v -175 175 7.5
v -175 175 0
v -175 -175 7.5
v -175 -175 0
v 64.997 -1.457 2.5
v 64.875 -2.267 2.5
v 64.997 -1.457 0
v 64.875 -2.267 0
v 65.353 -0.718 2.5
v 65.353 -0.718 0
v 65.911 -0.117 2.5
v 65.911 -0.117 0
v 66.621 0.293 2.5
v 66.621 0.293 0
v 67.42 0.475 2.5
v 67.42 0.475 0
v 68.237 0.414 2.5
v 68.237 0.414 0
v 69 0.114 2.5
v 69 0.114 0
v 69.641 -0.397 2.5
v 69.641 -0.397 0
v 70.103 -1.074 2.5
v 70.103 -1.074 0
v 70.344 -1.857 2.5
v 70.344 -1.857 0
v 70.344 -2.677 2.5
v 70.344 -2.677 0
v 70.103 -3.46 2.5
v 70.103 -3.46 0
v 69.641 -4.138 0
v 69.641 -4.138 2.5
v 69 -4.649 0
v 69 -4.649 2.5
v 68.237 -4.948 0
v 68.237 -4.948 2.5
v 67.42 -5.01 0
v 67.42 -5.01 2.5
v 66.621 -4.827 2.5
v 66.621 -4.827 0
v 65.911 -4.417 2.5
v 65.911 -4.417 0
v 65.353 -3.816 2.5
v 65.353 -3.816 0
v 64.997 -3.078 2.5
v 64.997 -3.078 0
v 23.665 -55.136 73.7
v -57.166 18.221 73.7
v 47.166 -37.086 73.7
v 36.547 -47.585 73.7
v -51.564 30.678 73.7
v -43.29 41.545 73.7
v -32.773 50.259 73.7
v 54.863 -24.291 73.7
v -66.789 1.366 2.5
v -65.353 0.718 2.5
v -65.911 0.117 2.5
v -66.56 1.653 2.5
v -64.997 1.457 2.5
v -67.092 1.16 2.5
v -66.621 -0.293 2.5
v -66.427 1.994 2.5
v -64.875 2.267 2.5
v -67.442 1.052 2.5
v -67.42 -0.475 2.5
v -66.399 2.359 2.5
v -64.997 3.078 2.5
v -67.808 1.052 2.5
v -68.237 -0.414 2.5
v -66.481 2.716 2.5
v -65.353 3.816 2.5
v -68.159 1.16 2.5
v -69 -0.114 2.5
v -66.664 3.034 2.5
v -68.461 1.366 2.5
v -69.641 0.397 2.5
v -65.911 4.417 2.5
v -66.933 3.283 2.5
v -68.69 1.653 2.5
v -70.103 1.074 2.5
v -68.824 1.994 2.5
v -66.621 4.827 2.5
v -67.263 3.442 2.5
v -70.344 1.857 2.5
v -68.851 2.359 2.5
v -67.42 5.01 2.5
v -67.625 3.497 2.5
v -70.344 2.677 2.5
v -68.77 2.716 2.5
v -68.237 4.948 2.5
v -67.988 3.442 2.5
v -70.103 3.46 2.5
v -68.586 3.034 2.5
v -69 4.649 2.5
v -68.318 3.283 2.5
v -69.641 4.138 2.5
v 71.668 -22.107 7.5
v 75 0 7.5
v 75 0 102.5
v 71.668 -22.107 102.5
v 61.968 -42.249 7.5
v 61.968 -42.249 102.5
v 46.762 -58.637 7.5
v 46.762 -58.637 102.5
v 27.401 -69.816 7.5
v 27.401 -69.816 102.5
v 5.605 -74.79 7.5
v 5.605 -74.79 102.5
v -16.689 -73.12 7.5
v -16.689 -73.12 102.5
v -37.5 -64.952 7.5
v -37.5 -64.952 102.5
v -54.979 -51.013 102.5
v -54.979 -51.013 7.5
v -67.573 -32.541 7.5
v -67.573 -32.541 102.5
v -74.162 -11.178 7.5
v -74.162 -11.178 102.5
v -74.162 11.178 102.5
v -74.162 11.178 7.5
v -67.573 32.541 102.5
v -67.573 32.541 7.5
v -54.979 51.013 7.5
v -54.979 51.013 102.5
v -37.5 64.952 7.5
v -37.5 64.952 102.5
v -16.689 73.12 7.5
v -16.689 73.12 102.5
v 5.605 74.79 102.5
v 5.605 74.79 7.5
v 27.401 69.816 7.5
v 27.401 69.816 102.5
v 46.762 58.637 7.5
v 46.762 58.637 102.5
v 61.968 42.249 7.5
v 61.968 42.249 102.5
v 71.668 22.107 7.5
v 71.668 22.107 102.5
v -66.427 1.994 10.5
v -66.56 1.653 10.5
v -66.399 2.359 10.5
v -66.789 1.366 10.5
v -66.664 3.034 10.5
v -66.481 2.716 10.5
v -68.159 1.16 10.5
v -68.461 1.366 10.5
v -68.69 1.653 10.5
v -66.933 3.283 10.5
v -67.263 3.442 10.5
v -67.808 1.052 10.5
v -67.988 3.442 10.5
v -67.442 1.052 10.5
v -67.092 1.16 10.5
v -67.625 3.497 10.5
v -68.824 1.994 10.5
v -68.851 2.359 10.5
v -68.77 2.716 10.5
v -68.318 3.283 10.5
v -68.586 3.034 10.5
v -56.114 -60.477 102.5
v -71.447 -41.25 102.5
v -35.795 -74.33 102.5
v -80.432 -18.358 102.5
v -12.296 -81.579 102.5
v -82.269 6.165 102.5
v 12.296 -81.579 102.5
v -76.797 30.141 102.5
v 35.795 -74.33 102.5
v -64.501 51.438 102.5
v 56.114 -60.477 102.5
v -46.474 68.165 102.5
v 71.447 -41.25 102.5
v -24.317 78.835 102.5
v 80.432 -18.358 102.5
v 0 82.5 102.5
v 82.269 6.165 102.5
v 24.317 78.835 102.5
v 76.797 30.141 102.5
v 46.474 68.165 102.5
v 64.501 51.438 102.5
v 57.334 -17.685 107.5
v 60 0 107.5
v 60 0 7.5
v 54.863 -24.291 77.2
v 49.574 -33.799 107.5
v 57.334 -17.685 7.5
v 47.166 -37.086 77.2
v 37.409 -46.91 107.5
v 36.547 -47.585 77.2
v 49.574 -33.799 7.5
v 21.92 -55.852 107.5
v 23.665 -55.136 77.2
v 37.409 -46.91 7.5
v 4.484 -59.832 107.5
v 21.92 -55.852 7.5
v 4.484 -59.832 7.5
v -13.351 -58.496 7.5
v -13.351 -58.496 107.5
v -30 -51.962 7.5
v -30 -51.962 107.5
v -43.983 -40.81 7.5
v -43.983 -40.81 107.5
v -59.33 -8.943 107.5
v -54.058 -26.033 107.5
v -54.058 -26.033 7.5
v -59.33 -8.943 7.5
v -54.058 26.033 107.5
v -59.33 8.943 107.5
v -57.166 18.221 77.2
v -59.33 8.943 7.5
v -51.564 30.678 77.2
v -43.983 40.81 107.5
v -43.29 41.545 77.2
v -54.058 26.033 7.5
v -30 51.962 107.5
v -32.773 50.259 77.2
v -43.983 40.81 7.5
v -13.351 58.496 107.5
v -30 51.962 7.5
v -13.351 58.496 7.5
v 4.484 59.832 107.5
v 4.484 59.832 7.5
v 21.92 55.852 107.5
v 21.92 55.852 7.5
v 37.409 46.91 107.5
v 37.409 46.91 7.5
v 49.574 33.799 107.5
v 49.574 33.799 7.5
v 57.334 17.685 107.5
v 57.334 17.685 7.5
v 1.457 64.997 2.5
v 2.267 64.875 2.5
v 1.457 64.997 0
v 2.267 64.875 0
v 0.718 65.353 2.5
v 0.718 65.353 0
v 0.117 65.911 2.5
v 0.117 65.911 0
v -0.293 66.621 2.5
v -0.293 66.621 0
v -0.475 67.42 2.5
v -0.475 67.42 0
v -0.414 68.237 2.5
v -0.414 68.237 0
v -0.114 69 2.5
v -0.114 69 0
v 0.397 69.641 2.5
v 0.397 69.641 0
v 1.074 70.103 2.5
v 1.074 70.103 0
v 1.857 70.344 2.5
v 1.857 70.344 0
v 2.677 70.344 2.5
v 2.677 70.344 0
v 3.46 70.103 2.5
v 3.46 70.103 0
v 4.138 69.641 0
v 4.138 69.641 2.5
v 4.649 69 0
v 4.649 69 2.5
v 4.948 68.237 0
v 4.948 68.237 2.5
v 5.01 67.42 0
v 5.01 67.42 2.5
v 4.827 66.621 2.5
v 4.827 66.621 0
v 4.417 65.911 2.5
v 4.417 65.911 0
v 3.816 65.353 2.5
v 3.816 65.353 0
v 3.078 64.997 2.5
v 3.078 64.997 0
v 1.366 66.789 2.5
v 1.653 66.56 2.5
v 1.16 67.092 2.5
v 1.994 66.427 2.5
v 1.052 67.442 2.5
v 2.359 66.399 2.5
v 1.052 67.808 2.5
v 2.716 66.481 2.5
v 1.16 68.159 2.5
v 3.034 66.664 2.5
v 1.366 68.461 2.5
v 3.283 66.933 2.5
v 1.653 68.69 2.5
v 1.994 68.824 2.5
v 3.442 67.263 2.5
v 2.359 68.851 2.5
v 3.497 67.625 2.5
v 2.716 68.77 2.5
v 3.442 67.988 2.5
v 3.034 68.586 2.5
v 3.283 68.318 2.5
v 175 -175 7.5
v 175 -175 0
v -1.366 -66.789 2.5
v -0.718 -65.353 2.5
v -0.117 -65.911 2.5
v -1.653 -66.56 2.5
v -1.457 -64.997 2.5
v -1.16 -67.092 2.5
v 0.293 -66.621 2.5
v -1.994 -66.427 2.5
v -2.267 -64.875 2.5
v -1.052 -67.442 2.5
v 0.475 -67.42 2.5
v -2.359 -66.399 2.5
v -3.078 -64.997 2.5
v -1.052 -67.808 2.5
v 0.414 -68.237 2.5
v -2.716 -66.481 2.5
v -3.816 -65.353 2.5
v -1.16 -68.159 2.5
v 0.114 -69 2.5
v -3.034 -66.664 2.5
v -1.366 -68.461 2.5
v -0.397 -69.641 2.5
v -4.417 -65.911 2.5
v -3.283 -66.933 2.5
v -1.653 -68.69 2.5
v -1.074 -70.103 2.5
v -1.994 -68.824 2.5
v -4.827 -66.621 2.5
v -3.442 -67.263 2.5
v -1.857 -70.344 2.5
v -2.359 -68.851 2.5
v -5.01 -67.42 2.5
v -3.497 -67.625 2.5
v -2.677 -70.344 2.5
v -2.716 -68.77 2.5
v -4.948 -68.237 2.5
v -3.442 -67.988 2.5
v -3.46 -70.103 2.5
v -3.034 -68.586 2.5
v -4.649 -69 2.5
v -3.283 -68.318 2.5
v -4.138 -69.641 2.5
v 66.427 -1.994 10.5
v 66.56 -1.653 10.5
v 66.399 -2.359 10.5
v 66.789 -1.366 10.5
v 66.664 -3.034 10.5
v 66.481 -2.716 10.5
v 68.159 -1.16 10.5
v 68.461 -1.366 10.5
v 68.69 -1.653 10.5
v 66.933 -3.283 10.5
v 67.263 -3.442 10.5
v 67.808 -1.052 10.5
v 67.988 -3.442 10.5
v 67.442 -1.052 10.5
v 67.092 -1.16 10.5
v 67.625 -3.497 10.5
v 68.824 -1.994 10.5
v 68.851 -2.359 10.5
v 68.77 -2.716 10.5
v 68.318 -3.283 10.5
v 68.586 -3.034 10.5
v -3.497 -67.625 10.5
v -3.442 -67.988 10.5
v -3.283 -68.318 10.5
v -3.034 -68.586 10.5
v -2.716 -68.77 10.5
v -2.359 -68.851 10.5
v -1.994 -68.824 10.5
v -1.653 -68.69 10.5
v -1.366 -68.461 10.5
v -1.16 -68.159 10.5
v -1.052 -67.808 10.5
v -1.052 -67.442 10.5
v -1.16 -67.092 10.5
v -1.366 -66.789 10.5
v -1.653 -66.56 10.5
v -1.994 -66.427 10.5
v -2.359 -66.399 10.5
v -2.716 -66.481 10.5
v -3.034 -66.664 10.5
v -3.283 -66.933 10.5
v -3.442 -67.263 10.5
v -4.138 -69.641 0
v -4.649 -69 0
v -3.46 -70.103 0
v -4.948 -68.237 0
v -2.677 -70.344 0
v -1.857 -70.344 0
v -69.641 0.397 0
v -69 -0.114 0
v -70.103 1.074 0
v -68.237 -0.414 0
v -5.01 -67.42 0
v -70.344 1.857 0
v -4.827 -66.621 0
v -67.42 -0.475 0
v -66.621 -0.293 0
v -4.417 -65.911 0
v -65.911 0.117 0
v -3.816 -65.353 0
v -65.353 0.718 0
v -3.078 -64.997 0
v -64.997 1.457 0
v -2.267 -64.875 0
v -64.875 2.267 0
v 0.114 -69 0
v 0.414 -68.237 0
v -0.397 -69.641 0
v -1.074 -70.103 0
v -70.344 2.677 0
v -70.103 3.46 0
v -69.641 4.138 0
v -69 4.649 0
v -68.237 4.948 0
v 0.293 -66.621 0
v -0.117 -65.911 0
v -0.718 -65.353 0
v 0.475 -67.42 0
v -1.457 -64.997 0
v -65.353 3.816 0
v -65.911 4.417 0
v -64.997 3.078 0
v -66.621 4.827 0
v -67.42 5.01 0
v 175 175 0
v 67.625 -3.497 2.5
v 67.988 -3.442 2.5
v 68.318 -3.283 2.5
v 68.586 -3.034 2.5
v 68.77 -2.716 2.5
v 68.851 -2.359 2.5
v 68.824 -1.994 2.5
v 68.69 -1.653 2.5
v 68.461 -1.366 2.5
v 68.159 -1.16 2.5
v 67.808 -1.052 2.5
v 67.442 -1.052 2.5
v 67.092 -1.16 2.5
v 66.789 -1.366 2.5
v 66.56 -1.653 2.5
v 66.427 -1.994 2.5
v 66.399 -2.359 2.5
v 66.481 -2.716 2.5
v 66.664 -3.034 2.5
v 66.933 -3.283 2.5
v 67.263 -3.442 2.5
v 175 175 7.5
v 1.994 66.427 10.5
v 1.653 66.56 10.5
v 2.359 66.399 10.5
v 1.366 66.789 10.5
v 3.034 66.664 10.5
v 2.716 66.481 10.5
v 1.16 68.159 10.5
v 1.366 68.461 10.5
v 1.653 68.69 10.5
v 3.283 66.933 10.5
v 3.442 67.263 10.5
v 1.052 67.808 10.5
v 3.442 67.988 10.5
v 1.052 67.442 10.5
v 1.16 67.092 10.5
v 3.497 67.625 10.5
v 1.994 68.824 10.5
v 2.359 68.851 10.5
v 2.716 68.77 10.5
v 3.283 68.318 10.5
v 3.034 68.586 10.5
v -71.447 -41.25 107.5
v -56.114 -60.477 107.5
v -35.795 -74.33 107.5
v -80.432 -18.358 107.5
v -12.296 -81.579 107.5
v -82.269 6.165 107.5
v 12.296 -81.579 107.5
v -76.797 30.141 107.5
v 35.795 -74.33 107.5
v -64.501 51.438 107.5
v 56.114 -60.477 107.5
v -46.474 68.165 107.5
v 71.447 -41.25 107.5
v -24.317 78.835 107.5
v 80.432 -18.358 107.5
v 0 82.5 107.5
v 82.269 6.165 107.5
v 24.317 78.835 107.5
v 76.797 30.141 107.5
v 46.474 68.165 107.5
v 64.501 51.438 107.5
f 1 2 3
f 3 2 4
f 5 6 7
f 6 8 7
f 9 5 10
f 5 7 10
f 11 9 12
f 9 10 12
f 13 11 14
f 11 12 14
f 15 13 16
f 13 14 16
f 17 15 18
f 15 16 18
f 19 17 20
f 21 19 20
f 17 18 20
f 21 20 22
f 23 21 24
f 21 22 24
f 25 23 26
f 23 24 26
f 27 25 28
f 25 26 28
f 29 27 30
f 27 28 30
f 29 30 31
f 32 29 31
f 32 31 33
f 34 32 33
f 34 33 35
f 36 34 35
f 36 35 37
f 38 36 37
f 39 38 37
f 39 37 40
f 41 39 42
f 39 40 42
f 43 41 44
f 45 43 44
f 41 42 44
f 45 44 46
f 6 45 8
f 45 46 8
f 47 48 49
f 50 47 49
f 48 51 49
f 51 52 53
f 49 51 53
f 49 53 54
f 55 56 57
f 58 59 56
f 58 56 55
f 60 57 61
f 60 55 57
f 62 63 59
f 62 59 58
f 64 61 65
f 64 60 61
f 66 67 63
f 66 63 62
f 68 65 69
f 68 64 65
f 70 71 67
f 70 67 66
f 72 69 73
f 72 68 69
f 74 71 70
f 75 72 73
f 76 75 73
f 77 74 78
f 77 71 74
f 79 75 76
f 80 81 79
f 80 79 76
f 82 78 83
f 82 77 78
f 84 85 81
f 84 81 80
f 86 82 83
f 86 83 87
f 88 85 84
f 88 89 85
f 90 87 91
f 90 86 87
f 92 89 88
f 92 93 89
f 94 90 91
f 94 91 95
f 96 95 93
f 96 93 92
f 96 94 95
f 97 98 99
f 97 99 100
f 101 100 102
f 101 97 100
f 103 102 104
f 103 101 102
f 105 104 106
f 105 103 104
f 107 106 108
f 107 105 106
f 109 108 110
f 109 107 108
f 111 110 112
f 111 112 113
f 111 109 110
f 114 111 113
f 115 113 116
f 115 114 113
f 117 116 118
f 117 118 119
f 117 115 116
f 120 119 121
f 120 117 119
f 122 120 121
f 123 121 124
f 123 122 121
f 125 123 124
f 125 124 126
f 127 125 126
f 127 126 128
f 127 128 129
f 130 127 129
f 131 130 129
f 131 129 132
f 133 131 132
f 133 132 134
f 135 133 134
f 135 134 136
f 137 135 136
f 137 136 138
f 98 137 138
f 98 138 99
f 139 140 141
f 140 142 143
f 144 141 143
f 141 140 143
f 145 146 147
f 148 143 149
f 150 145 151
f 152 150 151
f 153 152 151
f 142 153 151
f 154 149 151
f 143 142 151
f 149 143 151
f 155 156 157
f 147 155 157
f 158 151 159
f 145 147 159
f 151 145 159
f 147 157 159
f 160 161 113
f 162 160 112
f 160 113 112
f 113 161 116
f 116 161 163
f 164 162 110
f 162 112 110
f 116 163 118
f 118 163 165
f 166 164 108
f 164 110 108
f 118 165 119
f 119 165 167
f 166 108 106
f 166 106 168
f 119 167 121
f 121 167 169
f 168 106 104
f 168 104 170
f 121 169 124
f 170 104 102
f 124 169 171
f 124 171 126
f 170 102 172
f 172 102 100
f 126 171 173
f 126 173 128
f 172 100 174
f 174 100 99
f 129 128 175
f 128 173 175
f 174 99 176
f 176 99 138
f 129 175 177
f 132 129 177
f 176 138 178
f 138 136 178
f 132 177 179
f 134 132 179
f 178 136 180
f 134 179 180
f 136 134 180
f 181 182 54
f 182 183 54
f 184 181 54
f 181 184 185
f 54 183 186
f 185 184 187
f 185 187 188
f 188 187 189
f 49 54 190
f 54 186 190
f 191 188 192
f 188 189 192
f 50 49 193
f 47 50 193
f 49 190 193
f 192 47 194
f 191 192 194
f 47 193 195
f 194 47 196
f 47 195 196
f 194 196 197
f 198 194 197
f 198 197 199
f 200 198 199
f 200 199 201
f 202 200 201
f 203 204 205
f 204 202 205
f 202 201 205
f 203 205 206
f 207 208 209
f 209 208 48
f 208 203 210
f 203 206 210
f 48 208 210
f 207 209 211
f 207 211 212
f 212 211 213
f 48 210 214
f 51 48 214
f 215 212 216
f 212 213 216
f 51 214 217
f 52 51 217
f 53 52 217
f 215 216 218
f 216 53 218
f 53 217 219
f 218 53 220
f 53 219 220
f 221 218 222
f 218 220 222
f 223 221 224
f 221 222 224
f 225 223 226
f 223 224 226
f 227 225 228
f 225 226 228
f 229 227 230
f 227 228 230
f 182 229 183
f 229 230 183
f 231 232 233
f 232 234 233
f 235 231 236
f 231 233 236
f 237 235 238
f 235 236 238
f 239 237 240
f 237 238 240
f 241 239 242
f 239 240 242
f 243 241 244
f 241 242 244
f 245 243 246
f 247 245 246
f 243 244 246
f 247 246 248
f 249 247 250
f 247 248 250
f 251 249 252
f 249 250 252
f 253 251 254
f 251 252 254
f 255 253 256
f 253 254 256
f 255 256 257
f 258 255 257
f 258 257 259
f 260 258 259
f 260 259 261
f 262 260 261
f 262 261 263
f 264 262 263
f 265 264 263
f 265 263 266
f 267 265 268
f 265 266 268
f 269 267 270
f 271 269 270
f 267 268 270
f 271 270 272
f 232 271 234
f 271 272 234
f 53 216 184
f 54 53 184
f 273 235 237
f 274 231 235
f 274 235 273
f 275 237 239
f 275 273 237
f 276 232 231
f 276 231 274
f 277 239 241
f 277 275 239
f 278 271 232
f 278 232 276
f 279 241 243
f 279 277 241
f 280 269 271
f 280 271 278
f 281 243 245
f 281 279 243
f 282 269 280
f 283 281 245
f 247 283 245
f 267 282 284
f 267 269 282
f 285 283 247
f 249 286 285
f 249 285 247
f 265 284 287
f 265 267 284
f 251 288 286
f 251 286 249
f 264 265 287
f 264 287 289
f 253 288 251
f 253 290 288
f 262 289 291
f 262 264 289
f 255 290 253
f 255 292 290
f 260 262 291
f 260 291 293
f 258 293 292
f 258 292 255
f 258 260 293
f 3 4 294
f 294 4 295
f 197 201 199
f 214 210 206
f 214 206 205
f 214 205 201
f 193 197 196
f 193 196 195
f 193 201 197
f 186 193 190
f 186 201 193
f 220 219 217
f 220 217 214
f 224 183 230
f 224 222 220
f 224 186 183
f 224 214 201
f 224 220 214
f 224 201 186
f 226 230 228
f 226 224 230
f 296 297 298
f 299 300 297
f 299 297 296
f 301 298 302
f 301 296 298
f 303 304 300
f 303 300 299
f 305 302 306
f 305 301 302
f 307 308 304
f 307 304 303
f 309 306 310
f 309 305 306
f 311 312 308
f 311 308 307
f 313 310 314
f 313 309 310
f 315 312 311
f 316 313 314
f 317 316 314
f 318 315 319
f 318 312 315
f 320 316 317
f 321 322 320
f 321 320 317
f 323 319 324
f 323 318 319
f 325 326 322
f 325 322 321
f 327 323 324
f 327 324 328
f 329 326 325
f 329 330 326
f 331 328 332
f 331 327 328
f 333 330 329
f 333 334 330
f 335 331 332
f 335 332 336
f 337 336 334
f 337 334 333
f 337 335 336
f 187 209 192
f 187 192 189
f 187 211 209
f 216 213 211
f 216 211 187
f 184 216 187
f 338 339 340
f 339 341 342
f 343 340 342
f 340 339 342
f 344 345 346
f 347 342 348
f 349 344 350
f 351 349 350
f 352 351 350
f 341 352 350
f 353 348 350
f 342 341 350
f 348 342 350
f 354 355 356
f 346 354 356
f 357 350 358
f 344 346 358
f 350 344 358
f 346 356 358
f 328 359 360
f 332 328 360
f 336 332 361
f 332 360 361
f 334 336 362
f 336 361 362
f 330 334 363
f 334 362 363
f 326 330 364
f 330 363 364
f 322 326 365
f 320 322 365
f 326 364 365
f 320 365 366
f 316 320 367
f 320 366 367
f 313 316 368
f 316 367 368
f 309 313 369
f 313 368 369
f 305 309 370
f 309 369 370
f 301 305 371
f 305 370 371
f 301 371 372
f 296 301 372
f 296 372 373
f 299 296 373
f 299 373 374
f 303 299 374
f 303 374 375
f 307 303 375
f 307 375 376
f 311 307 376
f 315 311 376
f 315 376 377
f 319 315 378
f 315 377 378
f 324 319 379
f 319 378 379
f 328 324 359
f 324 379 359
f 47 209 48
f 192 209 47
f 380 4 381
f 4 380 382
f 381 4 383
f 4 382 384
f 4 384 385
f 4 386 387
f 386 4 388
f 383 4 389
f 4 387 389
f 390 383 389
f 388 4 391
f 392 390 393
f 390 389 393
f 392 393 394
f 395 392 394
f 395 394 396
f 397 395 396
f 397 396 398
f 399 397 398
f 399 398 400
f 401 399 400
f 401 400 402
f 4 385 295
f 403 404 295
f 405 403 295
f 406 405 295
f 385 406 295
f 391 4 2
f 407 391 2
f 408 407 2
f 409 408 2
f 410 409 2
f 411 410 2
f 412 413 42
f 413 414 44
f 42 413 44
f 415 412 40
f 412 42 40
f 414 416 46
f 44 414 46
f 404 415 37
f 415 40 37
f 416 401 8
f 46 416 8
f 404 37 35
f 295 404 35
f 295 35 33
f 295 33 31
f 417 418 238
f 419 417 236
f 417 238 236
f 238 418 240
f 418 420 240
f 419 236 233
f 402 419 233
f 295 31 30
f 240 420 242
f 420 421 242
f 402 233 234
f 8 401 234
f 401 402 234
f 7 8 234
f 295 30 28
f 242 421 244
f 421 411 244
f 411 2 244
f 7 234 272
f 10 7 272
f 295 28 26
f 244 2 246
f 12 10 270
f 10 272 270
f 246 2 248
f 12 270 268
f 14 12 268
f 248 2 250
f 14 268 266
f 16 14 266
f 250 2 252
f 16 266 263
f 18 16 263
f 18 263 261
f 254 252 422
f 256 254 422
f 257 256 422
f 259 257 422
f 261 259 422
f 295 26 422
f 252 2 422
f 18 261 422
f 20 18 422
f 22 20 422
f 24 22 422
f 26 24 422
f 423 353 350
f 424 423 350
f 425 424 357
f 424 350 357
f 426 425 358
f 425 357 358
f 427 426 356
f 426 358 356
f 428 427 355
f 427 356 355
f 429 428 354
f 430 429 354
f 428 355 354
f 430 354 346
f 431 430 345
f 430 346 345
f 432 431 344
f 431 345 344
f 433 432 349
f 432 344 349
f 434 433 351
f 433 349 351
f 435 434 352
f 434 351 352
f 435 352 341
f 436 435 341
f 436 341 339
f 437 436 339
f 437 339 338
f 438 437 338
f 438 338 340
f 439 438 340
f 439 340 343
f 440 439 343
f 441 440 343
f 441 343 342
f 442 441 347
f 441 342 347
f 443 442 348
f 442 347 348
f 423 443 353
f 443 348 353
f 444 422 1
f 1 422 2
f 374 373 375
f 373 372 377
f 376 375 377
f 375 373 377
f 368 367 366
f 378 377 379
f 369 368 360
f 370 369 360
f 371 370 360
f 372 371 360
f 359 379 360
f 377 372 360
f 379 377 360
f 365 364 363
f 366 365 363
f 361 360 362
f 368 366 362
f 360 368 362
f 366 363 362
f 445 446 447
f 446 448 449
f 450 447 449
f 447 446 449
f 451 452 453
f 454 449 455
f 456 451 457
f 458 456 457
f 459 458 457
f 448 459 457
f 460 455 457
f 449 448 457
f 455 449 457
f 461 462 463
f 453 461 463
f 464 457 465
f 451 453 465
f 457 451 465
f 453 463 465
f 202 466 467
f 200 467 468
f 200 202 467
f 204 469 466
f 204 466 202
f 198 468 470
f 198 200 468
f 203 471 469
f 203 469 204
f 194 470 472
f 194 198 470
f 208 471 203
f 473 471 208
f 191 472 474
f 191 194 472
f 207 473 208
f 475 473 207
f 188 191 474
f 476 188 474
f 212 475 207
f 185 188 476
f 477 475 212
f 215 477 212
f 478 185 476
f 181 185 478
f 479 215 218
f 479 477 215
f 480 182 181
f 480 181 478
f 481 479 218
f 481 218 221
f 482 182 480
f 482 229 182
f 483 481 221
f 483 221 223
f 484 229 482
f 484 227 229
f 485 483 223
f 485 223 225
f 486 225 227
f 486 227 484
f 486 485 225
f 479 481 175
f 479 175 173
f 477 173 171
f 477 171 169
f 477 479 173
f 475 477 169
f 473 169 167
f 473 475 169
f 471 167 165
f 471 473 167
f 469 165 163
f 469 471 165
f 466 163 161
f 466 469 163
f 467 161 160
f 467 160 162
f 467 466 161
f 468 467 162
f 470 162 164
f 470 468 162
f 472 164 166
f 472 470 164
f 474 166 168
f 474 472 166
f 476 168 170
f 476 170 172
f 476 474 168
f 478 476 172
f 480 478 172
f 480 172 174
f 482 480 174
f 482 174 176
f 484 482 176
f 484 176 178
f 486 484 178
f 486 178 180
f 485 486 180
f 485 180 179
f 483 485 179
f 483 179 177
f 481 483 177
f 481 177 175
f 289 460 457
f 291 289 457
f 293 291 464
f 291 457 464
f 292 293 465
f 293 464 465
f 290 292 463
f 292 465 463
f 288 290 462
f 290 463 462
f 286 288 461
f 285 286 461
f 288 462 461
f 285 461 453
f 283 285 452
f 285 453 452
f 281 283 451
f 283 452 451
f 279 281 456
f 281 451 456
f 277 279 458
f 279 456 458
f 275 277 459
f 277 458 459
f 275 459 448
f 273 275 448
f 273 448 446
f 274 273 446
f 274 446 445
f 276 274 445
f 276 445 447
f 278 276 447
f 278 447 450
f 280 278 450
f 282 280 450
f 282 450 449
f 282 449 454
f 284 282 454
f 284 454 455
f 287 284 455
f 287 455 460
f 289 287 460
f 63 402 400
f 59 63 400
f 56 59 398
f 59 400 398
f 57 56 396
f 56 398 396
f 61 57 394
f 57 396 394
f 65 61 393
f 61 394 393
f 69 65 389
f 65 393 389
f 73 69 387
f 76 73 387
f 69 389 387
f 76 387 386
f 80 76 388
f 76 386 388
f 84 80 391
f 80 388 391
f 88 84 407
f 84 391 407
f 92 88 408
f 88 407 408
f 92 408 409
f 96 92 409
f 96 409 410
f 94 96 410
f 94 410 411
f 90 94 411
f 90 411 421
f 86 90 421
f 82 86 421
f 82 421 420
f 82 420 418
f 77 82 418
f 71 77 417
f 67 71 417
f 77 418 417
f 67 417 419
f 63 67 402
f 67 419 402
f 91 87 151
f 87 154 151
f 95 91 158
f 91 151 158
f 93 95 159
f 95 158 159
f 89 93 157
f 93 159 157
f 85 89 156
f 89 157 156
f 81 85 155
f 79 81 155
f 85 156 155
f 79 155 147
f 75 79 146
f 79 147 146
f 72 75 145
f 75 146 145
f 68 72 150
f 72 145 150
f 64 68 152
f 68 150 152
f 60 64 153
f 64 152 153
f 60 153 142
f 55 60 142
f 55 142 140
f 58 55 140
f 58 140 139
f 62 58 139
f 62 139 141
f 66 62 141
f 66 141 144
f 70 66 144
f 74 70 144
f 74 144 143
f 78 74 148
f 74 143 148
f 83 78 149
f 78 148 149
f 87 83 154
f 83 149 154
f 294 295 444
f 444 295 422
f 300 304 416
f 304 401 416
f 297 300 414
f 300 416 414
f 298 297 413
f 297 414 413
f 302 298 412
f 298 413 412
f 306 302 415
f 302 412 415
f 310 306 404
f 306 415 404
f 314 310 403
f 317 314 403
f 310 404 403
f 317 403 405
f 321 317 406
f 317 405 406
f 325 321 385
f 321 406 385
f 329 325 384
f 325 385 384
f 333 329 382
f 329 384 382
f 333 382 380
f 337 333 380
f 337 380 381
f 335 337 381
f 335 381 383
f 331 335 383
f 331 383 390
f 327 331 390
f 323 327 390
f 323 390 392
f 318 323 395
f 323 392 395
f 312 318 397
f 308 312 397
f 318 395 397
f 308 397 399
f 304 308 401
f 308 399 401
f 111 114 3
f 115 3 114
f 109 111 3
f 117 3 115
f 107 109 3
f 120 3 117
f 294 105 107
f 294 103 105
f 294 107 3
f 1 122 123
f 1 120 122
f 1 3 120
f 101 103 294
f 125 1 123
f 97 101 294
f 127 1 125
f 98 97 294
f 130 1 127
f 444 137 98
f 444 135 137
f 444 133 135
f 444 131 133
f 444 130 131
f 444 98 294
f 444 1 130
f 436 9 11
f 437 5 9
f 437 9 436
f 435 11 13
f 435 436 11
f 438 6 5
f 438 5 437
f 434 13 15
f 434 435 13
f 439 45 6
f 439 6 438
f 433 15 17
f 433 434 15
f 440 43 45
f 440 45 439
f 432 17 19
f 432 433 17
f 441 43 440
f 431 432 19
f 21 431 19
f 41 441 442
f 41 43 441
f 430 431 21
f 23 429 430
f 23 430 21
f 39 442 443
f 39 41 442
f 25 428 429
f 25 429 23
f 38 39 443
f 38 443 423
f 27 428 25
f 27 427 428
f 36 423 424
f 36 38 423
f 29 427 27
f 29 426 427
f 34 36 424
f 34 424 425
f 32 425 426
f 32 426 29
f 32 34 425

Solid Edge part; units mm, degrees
sketch "Sketch1" plane through (0, 0, 0) normal (0, 0, 1) x (1, 0, 0)
  line L0 (-175, -175) -> (175, -175)
  line L1 (175, -175) -> (175, 175)
  line L2 (175, 175) -> (-175, 175)
  line L3 (-175, 175) -> (-175, -175)
  dimension "D1" = 350
  dimension "D2" = 350
extrude "Protrusion1" add sketch "Sketch1" along normal blind 7.5
sketch "Sketch2" plane through (0, 0, 7.5) normal (0, 0, 1) x (1, 0, 0)
  circle A0 centre (0, 0) radius 75
  circle A1 centre (0, 0) radius 60
extrude "Wyciągnięcie_2" add sketch "Sketch2" along normal blind 100
sketch "Sketch3" plane through (0, 0, 107.5) normal (0, 0, 1) x (0, 1, 0)
  circle A0 centre (0, 0) radius 82.5
  circle A1 centre (0, 0) radius 75
extrude "Wyciągnięcie_3" add sketch "Sketch3" against normal blind 5
sketch "Sketch4" plane through (0, 0, 77.2) normal (0, 0, 1) x (1, 0, 0)
  line L0 (-64.2773, 24.6751) -> (30.7757, -61.5897)
  line L1 (-39.7647, 56.2067) -> (61.855, -30.2388)
  arc A0 (-64.2773, 24.6751) -> (-39.7647, 56.2067) centre (0, 0) cw
  line L2 (30.7757, -61.5897) -> (61.855, -30.2388)
extrude "Wyciągnięcie_4" add sketch "Sketch4" against normal blind 3.5
hole "Otwór_1" at (-67.6252, 2.2673, 0) direction (0, 0, 1) diameter 2.459 depth 10.5
sketch "Sketch5" plane through (0, 0, 0) normal (0, 0, -1) x (1, 0, 0)
  circle A0 centre (-67.6252, -2.2673) radius 2.75
extrude "Wycięcie_1" cut sketch "Sketch5" against normal blind 2.5
pattern_circular "Pattern1" count 4 over 360 about axis through (0, 0, 0) along (0, 0, 1) of "Wycięcie_1", "Otwór_1"
